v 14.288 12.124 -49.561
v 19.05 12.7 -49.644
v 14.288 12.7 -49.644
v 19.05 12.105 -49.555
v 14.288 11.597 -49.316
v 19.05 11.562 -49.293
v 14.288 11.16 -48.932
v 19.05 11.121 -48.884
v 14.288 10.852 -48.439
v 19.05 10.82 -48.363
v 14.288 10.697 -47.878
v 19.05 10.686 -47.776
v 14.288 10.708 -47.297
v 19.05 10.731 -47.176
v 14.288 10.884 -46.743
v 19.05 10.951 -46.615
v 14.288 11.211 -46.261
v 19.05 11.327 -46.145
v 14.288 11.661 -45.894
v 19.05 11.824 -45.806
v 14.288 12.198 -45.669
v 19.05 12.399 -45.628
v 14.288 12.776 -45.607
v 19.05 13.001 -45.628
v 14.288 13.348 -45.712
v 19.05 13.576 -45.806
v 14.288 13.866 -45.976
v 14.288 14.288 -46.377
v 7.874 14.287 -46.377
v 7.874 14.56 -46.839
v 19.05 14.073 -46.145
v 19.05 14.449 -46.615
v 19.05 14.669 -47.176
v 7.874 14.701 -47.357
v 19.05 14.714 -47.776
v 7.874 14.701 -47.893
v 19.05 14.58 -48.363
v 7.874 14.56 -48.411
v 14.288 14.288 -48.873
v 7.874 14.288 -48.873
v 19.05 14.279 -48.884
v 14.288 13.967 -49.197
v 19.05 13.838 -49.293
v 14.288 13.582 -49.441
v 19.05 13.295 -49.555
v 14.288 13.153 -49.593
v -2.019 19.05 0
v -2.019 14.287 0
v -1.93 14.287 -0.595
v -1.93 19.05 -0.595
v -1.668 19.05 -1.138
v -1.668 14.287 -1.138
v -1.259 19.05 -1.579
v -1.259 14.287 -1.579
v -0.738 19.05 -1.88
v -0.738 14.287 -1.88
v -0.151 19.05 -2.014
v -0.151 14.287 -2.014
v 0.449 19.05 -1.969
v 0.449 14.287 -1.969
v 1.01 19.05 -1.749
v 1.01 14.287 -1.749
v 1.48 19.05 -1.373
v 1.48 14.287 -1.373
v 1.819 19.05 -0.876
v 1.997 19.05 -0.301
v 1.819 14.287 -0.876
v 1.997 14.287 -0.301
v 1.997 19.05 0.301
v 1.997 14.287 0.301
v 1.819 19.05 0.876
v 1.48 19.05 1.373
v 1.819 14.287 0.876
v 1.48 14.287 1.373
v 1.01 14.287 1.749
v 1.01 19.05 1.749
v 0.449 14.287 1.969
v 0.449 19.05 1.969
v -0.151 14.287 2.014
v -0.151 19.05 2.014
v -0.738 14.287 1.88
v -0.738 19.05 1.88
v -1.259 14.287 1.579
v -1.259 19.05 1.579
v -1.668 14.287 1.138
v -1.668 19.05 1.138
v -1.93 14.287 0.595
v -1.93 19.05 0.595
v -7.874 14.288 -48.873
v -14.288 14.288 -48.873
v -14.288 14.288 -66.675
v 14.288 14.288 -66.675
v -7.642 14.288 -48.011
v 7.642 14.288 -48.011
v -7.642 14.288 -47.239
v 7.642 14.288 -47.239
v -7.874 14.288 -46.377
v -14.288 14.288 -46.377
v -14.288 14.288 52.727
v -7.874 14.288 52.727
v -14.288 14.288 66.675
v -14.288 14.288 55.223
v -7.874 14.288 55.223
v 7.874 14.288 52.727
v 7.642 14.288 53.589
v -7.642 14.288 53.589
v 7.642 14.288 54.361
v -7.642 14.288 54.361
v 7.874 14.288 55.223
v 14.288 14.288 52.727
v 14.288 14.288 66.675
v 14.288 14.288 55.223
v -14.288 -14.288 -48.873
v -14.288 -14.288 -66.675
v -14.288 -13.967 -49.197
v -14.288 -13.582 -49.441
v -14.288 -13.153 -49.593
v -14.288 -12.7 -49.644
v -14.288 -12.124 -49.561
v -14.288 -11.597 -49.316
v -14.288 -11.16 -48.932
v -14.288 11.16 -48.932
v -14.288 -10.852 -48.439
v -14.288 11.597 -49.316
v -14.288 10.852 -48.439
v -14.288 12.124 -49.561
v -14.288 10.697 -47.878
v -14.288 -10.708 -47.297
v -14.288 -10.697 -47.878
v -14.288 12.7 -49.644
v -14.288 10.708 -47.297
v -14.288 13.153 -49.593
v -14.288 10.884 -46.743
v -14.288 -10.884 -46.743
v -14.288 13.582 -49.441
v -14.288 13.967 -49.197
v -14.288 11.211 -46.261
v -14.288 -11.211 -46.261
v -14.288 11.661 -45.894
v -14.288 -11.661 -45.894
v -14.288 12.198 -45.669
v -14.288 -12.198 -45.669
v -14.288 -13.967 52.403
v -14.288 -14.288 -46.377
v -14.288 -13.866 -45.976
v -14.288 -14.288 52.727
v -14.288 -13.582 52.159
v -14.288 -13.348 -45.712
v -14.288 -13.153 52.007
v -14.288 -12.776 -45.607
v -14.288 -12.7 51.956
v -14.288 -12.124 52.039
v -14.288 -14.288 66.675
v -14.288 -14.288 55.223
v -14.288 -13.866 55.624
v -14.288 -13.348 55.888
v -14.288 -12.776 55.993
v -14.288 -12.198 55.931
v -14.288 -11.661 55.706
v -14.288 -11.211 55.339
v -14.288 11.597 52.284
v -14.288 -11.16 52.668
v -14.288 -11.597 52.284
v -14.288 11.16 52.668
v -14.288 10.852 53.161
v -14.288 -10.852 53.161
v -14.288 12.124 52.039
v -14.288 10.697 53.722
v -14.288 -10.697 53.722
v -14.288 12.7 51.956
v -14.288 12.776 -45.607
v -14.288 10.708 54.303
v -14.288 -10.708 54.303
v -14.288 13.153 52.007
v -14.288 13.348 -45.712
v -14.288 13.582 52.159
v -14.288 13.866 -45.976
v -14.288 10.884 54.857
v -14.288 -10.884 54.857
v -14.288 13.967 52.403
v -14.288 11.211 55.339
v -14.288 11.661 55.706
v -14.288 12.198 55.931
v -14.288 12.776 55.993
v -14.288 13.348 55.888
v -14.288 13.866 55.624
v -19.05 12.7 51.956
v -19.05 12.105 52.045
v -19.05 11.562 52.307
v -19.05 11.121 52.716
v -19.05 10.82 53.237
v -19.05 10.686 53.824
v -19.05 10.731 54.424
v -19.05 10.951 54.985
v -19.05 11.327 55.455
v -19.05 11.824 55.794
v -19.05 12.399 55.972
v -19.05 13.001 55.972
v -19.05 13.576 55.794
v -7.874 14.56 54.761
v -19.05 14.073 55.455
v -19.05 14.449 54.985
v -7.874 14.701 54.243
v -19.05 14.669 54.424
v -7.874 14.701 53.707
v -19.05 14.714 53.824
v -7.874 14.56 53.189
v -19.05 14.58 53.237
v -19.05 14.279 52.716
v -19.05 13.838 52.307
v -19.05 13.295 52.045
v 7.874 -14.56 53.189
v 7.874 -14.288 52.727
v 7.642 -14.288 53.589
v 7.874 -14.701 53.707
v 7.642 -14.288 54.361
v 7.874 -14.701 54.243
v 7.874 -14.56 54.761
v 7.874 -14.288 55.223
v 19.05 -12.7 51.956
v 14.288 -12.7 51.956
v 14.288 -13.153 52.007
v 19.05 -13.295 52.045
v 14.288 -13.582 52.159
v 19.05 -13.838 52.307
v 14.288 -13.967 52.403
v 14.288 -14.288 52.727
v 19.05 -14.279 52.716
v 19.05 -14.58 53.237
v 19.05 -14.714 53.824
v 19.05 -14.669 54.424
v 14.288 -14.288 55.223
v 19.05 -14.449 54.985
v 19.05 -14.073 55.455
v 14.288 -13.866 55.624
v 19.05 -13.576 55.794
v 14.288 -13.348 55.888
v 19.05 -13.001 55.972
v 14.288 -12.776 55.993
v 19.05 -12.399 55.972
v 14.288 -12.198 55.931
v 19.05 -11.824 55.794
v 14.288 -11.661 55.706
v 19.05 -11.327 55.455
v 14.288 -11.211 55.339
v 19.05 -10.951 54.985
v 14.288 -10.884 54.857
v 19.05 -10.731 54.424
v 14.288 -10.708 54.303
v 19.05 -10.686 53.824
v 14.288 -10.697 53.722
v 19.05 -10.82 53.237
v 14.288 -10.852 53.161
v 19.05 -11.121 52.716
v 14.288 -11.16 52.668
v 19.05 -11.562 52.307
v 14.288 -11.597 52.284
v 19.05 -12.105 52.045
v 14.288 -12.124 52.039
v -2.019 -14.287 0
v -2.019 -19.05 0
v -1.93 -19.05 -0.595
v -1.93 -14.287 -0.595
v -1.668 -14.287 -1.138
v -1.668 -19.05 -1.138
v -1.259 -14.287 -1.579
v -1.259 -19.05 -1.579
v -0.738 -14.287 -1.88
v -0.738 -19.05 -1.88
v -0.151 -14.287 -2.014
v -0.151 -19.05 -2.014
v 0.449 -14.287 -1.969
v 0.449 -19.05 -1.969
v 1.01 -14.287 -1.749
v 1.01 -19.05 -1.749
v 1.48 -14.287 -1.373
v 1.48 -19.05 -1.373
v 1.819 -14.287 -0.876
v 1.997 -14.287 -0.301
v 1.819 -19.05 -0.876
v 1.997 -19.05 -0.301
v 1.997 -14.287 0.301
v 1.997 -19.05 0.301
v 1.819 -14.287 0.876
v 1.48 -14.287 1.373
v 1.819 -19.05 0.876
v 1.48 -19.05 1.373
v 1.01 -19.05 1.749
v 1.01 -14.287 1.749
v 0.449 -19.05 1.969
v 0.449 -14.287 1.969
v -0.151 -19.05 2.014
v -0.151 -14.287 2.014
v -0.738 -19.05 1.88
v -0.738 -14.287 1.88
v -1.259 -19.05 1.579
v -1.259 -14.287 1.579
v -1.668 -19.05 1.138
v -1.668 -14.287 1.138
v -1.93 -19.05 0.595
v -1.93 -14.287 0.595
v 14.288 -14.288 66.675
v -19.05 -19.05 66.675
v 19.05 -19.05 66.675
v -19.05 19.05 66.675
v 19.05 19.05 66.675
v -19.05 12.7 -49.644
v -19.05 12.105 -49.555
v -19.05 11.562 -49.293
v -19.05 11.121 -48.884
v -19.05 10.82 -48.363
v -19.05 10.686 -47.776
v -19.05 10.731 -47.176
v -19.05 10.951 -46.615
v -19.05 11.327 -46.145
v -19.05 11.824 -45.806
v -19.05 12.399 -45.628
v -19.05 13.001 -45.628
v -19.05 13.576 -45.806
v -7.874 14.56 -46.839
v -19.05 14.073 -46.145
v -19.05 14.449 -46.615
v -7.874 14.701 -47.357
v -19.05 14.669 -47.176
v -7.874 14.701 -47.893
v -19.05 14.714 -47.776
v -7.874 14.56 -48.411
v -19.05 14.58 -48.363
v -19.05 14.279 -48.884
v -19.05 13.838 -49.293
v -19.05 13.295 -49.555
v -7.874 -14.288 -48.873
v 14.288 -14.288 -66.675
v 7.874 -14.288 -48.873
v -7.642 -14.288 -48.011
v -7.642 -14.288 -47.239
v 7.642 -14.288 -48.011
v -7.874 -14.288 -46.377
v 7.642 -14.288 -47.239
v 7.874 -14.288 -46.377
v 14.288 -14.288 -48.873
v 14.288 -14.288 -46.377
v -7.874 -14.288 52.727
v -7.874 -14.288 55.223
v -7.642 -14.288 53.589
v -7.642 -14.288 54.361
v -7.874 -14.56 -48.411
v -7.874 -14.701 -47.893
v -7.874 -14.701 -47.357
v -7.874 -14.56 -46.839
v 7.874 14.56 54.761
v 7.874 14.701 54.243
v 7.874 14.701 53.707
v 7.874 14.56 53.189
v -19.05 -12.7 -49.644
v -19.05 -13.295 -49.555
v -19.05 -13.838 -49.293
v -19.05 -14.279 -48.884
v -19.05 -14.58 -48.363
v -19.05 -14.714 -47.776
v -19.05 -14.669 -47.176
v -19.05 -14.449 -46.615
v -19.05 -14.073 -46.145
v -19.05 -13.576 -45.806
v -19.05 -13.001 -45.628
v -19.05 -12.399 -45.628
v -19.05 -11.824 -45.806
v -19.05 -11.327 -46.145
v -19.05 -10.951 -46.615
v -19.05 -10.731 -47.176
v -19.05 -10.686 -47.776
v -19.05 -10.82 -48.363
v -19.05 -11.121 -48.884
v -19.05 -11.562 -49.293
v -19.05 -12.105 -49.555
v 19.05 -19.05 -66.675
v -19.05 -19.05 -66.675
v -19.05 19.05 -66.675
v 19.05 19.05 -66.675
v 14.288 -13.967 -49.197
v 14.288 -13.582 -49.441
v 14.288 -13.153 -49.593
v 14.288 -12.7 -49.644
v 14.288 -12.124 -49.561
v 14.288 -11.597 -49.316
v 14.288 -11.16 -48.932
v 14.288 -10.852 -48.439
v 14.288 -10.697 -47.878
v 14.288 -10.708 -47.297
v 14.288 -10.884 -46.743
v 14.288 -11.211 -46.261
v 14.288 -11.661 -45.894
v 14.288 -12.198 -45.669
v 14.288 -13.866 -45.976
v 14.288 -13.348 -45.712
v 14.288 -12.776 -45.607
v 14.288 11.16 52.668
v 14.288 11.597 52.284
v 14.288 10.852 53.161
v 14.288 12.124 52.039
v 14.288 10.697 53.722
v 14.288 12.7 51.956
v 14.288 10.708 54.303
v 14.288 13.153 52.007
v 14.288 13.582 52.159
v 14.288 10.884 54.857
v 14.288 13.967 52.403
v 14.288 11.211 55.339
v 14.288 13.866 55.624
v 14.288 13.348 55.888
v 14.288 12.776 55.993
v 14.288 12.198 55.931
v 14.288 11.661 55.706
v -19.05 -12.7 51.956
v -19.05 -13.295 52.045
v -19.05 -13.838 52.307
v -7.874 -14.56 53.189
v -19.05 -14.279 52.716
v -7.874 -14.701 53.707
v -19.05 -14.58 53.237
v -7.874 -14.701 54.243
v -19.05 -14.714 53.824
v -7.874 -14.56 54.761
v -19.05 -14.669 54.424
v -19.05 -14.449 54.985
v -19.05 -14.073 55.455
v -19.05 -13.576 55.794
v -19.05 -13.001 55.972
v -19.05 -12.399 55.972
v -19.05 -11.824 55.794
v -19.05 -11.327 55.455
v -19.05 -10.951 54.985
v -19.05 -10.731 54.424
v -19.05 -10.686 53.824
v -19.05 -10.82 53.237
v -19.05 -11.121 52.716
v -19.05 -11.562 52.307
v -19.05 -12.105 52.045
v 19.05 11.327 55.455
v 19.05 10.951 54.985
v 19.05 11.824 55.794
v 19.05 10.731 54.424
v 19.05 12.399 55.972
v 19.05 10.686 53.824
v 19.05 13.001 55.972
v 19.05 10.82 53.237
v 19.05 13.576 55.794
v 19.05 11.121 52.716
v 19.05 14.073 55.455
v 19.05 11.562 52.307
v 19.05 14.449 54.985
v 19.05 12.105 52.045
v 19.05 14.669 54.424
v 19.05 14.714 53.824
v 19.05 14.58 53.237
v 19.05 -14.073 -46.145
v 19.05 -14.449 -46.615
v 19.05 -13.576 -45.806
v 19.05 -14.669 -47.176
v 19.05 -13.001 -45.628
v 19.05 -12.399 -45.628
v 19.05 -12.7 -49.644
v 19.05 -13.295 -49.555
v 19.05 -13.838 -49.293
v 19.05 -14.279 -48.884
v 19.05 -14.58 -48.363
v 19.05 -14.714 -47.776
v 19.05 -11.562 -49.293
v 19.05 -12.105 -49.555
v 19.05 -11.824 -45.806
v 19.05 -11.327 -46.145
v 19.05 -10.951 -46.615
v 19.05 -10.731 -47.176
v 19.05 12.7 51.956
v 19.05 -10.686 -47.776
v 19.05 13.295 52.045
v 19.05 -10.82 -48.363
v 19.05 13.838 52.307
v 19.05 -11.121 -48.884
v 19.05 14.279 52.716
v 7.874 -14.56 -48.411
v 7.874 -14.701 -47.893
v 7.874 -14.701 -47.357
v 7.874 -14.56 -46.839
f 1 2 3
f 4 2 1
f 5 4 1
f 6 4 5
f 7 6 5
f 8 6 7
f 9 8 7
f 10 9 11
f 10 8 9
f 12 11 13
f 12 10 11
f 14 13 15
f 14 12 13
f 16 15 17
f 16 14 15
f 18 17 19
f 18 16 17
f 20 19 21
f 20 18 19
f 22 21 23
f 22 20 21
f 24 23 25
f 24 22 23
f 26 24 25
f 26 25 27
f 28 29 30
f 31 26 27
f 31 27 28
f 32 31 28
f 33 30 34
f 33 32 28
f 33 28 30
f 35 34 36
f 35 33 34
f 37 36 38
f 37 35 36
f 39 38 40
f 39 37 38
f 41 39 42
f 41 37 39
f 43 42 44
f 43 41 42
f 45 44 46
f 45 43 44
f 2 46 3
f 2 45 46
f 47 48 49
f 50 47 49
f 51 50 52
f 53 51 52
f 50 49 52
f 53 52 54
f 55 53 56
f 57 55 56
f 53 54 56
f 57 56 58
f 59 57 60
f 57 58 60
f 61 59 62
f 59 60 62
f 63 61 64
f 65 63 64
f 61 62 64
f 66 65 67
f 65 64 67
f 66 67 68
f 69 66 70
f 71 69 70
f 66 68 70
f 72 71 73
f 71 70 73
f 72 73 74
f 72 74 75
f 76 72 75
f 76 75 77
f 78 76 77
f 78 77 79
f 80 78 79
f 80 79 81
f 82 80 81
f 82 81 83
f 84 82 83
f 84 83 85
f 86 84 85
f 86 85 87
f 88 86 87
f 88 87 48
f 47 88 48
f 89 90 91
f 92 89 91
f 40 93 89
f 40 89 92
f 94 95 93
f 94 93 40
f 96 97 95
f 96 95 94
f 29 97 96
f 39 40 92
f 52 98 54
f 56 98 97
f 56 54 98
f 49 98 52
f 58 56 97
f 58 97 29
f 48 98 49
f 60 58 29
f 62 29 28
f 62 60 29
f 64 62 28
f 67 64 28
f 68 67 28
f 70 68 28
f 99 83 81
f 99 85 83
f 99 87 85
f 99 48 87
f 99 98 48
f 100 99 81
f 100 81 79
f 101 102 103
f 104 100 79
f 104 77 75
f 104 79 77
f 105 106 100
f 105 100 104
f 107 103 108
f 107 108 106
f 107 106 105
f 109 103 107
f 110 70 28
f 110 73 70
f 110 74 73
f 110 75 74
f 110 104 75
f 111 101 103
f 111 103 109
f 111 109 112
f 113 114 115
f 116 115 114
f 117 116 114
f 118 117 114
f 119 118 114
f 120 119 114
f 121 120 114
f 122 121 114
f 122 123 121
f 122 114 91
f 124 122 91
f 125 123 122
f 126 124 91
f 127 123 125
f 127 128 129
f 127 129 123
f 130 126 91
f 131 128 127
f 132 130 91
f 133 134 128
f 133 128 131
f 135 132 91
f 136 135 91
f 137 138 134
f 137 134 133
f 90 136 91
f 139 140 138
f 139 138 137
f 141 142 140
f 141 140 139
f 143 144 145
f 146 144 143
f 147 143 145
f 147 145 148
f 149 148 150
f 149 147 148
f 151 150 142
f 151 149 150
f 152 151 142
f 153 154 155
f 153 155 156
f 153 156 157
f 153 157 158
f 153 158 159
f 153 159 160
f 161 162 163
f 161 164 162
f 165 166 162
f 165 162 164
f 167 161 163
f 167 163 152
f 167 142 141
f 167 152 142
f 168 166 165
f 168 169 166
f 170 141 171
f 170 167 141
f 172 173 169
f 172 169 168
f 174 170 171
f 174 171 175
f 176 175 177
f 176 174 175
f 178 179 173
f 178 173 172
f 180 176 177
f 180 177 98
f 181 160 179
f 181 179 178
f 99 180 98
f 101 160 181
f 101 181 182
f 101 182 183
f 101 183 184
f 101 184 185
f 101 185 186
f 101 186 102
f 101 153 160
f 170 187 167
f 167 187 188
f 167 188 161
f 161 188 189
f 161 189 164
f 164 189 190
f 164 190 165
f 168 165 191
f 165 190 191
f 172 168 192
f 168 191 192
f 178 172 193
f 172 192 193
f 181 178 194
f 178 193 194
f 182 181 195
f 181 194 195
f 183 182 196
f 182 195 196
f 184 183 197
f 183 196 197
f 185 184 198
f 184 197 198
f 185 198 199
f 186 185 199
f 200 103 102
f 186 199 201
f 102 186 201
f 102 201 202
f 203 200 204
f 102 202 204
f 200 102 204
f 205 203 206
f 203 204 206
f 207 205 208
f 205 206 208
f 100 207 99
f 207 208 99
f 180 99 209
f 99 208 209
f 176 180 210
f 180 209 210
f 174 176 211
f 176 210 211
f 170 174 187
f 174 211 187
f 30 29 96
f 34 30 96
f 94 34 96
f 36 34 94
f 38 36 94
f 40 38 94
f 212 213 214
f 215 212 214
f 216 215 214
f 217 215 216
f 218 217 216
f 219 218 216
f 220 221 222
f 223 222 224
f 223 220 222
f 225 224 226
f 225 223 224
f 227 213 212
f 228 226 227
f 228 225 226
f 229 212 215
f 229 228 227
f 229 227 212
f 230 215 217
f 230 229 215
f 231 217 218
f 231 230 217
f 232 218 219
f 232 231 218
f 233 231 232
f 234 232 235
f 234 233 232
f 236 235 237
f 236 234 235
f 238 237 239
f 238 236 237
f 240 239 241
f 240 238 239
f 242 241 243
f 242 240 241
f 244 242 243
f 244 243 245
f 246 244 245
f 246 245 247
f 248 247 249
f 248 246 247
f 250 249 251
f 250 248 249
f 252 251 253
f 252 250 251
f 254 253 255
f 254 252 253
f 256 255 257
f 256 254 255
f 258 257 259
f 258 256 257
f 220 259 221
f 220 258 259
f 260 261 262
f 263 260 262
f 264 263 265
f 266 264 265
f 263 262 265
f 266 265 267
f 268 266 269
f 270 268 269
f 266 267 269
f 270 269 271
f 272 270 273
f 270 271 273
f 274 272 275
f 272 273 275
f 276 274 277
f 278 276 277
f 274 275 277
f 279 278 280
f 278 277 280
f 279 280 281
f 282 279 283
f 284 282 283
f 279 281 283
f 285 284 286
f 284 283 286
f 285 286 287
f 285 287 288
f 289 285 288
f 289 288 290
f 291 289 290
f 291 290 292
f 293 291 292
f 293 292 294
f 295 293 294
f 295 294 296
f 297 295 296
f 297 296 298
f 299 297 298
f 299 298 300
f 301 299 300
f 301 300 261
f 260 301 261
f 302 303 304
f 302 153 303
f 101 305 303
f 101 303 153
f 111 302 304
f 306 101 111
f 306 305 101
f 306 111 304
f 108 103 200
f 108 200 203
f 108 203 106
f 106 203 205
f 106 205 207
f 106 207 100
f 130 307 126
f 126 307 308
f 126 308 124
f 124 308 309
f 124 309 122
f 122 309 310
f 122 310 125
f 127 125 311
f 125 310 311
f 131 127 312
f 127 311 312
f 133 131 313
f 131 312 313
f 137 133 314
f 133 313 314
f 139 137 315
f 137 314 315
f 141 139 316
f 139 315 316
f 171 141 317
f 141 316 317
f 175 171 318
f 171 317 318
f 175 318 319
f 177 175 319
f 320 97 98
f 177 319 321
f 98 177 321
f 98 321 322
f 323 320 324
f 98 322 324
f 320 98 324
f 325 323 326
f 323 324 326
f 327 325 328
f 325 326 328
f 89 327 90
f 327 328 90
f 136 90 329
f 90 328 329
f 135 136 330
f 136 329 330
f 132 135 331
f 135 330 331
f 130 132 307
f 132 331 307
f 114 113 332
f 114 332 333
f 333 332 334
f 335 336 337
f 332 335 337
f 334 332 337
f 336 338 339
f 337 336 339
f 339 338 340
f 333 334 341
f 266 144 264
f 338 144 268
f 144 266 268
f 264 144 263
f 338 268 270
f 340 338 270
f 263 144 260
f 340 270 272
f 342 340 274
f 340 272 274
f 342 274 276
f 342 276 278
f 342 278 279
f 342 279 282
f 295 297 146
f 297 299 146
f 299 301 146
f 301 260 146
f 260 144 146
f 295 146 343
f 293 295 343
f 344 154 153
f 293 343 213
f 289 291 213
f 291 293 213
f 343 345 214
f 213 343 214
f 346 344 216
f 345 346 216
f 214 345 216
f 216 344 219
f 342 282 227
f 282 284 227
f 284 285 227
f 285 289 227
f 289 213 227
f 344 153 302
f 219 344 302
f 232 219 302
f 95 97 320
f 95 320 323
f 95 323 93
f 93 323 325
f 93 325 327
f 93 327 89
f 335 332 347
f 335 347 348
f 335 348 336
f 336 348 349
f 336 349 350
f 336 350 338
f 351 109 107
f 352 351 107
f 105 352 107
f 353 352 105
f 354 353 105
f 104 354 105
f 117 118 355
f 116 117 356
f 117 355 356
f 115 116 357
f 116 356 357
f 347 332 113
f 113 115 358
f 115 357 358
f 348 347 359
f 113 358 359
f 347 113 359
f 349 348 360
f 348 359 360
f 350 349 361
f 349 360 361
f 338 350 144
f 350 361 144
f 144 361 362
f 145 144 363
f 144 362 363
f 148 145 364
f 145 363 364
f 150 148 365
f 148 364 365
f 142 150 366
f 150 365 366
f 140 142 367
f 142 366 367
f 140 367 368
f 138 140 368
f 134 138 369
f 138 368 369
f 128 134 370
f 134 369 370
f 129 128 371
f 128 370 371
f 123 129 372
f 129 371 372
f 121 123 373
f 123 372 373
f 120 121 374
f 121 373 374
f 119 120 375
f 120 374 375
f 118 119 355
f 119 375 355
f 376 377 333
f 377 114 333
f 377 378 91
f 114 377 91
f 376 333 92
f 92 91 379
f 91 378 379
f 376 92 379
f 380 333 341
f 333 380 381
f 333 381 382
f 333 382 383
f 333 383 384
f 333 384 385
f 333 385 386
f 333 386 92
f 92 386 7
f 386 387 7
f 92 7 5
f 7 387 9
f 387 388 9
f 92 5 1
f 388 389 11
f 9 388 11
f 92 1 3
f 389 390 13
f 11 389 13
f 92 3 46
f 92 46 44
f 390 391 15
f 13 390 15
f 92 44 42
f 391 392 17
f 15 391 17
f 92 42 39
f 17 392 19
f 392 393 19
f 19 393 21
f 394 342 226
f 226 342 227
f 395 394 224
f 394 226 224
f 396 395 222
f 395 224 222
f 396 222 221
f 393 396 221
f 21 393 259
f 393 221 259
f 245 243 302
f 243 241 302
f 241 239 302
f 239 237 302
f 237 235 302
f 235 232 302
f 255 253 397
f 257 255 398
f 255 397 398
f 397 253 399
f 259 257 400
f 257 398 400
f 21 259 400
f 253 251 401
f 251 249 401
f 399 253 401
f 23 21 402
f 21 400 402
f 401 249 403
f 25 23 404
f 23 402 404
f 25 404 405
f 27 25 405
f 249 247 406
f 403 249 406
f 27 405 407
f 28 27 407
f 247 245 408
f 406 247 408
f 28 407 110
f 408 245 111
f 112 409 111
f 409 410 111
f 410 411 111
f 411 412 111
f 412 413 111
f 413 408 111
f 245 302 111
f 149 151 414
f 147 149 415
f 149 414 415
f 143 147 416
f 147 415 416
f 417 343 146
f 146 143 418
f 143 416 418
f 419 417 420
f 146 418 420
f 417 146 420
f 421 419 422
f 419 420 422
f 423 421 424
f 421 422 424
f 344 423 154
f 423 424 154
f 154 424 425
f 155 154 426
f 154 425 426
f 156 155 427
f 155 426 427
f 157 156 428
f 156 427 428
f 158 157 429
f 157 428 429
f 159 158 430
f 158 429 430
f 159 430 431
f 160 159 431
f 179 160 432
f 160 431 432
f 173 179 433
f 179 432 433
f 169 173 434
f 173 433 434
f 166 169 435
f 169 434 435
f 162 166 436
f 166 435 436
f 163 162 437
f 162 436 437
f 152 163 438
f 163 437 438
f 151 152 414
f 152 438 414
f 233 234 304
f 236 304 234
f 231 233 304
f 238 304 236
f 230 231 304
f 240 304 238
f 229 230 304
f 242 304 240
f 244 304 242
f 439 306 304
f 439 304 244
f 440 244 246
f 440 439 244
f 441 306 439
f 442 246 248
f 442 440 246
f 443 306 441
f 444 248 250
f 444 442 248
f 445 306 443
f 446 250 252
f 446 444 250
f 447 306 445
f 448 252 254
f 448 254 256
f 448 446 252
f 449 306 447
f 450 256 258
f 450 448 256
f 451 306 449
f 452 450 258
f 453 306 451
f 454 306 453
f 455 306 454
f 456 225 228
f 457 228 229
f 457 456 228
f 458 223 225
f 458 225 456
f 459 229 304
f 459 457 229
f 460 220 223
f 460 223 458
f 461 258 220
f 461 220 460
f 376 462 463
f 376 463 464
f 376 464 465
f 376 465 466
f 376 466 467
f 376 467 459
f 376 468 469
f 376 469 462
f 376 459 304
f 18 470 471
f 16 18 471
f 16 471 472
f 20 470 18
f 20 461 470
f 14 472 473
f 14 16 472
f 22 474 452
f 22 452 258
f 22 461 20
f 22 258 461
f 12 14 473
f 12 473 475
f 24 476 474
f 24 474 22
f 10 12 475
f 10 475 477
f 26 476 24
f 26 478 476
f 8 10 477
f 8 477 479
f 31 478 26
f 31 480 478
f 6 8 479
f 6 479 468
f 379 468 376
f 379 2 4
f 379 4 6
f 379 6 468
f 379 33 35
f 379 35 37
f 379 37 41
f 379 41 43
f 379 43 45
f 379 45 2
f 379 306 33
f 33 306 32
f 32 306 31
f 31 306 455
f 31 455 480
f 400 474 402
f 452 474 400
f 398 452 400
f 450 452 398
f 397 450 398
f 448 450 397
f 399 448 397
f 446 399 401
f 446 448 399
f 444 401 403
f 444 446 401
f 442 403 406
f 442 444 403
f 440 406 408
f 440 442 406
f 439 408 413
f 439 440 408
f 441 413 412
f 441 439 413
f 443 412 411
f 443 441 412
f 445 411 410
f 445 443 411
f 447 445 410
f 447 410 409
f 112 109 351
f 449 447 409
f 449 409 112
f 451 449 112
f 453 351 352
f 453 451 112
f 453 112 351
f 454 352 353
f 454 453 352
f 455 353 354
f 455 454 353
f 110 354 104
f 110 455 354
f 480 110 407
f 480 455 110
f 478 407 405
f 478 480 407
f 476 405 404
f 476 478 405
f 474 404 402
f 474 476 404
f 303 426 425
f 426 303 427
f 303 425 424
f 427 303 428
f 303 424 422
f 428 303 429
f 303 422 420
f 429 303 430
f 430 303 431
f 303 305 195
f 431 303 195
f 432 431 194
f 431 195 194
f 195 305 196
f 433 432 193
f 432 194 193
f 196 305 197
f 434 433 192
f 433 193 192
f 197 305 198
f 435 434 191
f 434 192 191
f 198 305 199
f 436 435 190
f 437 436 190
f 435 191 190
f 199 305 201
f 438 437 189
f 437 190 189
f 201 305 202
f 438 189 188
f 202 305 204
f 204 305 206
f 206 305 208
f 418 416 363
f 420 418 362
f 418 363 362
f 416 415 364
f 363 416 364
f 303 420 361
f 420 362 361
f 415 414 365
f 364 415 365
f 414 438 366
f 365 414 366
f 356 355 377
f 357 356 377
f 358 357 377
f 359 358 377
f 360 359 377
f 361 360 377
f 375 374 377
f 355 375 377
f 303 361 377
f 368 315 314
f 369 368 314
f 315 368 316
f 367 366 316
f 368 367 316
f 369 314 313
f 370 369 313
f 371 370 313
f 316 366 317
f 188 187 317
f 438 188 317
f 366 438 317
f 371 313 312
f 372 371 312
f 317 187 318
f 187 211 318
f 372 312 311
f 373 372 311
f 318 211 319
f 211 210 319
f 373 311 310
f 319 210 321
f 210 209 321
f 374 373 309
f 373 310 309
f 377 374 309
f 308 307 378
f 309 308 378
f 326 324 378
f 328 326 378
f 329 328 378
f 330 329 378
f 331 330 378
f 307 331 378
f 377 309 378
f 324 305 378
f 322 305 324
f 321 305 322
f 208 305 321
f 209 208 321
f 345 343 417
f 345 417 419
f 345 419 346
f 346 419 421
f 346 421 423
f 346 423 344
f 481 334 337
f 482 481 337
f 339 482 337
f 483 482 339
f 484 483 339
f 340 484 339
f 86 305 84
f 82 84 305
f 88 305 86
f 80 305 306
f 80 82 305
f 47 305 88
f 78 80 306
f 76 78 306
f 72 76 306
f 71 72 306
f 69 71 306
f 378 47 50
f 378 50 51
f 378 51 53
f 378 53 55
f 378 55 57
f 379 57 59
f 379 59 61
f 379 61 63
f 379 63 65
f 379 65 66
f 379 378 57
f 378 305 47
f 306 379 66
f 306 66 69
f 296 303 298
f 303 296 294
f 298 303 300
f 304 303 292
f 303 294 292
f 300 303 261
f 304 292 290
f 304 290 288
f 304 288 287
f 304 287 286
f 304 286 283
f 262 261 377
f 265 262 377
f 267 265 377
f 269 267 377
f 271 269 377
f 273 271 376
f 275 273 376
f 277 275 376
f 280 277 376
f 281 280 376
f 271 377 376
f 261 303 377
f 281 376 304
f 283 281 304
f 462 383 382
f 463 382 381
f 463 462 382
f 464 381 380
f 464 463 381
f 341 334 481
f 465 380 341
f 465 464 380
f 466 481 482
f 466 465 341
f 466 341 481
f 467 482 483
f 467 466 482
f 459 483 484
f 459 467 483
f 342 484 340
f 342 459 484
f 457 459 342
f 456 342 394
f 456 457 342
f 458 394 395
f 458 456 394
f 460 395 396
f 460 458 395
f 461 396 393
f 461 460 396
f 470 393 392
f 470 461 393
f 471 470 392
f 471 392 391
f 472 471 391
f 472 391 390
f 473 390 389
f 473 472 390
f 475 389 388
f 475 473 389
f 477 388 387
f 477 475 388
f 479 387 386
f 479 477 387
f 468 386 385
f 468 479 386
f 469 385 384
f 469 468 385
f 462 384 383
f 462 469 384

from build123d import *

# Parameters (mm, degrees)
SKETCH1_W                       = 38.1
SKETCH1_H                       = 133.35
BOSS_EXTRUDE1_DEPTH             = 19.05
SKETCH2_W                       = 28.575
SKETCH2_H                       = 28.575
CUT_EXTRUDE1_DEPTH              = 134.35
F_10_32_TAPPED_HOLE1_AT_2_COUNT = 2
F_10_32_TAPPED_HOLE1_AT_2_PITCH = 25.4
F_10_32_TAPPED_HOLE1_AT_3_COUNT = 2
F_10_32_TAPPED_HOLE1_AT_3_PITCH = 104.726882891
F_10_32_TAPPED_HOLE1_AT_4_COUNT = 2
F_10_32_TAPPED_HOLE1_AT_4_PITCH = 101.6
F_10_32_TAPPED_HOLE2_D          = 4.0386


with BuildPart() as part:
    # Sketch1 → Boss-Extrude1 (new body, symmetric)
    with BuildSketch(Plane(origin=(0, 0, 0), x_dir=(1, 0, 0), z_dir=(0, 1, 0))):
        Rectangle(SKETCH1_W, SKETCH1_H)
    extrude(amount=BOSS_EXTRUDE1_DEPTH, both=True)

    # Sketch2 → Cut-Extrude1 (cut, through all)
    with BuildSketch(Plane.XY.offset(66.675)):
        Rectangle(SKETCH2_W, SKETCH2_H)
    extrude(amount=-CUT_EXTRUDE1_DEPTH, mode=Mode.SUBTRACT)

    # Sketch3 → #10-32 Tapped Hole1 (revolve, cut)
    with BuildSketch(Plane(origin=(19.05, -12.7, 53.975), x_dir=(0, 0, -1), z_dir=(0, 1, 0))):
        Polygon((0, 0), (0, 12.389317848), (2.0193, 11.176), (2.0193, 0), align=None)
    f_10_32_tapped_hole1 = revolve(axis=Axis((25.4, -12.7, 53.975), (-1, 0, 0)), mode=Mode.SUBTRACT)

    # #10-32 Tapped Hole1 at 2: #10-32 Tapped Hole1 ×2
    with Locations(*[(0, i * F_10_32_TAPPED_HOLE1_AT_2_PITCH, 0) for i in range(1, F_10_32_TAPPED_HOLE1_AT_2_COUNT)]):
        add(f_10_32_tapped_hole1, mode=Mode.SUBTRACT)

    # #10-32 Tapped Hole1 at 3: #10-32 Tapped Hole1 ×2
    with Locations(*[Vector(0, 0.242535625, -0.9701425) * (i * F_10_32_TAPPED_HOLE1_AT_3_PITCH) for i in range(1, F_10_32_TAPPED_HOLE1_AT_3_COUNT)]):
        add(f_10_32_tapped_hole1, mode=Mode.SUBTRACT)

    # #10-32 Tapped Hole1 at 4: #10-32 Tapped Hole1 ×2
    with Locations(*[(0, 0, -i * F_10_32_TAPPED_HOLE1_AT_4_PITCH) for i in range(1, F_10_32_TAPPED_HOLE1_AT_4_COUNT)]):
        add(f_10_32_tapped_hole1, mode=Mode.SUBTRACT)

    # #10-32 Tapped Hole2 (through all)
    with Locations(Plane(origin=(0, 19.05, 0), x_dir=(1, 0, 0), z_dir=(0, 1, 0))):
        with Locations((0, 0)):
            Hole(F_10_32_TAPPED_HOLE2_D / 2)

    # Mirror1: #10-32 Tapped Hole1 across plane
    add(f_10_32_tapped_hole1.mirror(Plane(origin=(0, 0, 0), x_dir=(0, 0, 1), z_dir=(1, 0, 0))), mode=Mode.SUBTRACT)

    # Mirror1 copy 1 sketch → Mirror1 copy 1 (revolve, cut)
    with BuildSketch(Plane(origin=(-19.05, 12.7, 53.975), x_dir=(0, 0, -1), z_dir=(0, 1, 0))):
        Polygon((0, 0), (0, -12.389317848), (2.0193, -11.176), (2.0193, 0), align=None)
    revolve(axis=Axis((-25.4, 12.7, 53.975), (-1, 0, 0)), mode=Mode.SUBTRACT)

    # Mirror1 copy 2 sketch → Mirror1 copy 2 (revolve, cut)
    with BuildSketch(Plane(origin=(-19.05, 12.7, -47.625), x_dir=(0, 0, -1), z_dir=(0, 1, 0))):
        Polygon((0, 0), (0, -12.389317848), (2.0193, -11.176), (2.0193, 0), align=None)
    revolve(axis=Axis((-25.4, 12.7, -47.625), (-1, 0, 0)), mode=Mode.SUBTRACT)

    # Mirror1 copy 3 sketch → Mirror1 copy 3 (revolve, cut)
    with BuildSketch(Plane(origin=(-19.05, -12.7, -47.625), x_dir=(0, 0, -1), z_dir=(0, 1, 0))):
        Polygon((0, 0), (0, -12.389317848), (2.0193, -11.176), (2.0193, 0), align=None)
    revolve(axis=Axis((-25.4, -12.7, -47.625), (-1, 0, 0)), mode=Mode.SUBTRACT)


solid = part.part
